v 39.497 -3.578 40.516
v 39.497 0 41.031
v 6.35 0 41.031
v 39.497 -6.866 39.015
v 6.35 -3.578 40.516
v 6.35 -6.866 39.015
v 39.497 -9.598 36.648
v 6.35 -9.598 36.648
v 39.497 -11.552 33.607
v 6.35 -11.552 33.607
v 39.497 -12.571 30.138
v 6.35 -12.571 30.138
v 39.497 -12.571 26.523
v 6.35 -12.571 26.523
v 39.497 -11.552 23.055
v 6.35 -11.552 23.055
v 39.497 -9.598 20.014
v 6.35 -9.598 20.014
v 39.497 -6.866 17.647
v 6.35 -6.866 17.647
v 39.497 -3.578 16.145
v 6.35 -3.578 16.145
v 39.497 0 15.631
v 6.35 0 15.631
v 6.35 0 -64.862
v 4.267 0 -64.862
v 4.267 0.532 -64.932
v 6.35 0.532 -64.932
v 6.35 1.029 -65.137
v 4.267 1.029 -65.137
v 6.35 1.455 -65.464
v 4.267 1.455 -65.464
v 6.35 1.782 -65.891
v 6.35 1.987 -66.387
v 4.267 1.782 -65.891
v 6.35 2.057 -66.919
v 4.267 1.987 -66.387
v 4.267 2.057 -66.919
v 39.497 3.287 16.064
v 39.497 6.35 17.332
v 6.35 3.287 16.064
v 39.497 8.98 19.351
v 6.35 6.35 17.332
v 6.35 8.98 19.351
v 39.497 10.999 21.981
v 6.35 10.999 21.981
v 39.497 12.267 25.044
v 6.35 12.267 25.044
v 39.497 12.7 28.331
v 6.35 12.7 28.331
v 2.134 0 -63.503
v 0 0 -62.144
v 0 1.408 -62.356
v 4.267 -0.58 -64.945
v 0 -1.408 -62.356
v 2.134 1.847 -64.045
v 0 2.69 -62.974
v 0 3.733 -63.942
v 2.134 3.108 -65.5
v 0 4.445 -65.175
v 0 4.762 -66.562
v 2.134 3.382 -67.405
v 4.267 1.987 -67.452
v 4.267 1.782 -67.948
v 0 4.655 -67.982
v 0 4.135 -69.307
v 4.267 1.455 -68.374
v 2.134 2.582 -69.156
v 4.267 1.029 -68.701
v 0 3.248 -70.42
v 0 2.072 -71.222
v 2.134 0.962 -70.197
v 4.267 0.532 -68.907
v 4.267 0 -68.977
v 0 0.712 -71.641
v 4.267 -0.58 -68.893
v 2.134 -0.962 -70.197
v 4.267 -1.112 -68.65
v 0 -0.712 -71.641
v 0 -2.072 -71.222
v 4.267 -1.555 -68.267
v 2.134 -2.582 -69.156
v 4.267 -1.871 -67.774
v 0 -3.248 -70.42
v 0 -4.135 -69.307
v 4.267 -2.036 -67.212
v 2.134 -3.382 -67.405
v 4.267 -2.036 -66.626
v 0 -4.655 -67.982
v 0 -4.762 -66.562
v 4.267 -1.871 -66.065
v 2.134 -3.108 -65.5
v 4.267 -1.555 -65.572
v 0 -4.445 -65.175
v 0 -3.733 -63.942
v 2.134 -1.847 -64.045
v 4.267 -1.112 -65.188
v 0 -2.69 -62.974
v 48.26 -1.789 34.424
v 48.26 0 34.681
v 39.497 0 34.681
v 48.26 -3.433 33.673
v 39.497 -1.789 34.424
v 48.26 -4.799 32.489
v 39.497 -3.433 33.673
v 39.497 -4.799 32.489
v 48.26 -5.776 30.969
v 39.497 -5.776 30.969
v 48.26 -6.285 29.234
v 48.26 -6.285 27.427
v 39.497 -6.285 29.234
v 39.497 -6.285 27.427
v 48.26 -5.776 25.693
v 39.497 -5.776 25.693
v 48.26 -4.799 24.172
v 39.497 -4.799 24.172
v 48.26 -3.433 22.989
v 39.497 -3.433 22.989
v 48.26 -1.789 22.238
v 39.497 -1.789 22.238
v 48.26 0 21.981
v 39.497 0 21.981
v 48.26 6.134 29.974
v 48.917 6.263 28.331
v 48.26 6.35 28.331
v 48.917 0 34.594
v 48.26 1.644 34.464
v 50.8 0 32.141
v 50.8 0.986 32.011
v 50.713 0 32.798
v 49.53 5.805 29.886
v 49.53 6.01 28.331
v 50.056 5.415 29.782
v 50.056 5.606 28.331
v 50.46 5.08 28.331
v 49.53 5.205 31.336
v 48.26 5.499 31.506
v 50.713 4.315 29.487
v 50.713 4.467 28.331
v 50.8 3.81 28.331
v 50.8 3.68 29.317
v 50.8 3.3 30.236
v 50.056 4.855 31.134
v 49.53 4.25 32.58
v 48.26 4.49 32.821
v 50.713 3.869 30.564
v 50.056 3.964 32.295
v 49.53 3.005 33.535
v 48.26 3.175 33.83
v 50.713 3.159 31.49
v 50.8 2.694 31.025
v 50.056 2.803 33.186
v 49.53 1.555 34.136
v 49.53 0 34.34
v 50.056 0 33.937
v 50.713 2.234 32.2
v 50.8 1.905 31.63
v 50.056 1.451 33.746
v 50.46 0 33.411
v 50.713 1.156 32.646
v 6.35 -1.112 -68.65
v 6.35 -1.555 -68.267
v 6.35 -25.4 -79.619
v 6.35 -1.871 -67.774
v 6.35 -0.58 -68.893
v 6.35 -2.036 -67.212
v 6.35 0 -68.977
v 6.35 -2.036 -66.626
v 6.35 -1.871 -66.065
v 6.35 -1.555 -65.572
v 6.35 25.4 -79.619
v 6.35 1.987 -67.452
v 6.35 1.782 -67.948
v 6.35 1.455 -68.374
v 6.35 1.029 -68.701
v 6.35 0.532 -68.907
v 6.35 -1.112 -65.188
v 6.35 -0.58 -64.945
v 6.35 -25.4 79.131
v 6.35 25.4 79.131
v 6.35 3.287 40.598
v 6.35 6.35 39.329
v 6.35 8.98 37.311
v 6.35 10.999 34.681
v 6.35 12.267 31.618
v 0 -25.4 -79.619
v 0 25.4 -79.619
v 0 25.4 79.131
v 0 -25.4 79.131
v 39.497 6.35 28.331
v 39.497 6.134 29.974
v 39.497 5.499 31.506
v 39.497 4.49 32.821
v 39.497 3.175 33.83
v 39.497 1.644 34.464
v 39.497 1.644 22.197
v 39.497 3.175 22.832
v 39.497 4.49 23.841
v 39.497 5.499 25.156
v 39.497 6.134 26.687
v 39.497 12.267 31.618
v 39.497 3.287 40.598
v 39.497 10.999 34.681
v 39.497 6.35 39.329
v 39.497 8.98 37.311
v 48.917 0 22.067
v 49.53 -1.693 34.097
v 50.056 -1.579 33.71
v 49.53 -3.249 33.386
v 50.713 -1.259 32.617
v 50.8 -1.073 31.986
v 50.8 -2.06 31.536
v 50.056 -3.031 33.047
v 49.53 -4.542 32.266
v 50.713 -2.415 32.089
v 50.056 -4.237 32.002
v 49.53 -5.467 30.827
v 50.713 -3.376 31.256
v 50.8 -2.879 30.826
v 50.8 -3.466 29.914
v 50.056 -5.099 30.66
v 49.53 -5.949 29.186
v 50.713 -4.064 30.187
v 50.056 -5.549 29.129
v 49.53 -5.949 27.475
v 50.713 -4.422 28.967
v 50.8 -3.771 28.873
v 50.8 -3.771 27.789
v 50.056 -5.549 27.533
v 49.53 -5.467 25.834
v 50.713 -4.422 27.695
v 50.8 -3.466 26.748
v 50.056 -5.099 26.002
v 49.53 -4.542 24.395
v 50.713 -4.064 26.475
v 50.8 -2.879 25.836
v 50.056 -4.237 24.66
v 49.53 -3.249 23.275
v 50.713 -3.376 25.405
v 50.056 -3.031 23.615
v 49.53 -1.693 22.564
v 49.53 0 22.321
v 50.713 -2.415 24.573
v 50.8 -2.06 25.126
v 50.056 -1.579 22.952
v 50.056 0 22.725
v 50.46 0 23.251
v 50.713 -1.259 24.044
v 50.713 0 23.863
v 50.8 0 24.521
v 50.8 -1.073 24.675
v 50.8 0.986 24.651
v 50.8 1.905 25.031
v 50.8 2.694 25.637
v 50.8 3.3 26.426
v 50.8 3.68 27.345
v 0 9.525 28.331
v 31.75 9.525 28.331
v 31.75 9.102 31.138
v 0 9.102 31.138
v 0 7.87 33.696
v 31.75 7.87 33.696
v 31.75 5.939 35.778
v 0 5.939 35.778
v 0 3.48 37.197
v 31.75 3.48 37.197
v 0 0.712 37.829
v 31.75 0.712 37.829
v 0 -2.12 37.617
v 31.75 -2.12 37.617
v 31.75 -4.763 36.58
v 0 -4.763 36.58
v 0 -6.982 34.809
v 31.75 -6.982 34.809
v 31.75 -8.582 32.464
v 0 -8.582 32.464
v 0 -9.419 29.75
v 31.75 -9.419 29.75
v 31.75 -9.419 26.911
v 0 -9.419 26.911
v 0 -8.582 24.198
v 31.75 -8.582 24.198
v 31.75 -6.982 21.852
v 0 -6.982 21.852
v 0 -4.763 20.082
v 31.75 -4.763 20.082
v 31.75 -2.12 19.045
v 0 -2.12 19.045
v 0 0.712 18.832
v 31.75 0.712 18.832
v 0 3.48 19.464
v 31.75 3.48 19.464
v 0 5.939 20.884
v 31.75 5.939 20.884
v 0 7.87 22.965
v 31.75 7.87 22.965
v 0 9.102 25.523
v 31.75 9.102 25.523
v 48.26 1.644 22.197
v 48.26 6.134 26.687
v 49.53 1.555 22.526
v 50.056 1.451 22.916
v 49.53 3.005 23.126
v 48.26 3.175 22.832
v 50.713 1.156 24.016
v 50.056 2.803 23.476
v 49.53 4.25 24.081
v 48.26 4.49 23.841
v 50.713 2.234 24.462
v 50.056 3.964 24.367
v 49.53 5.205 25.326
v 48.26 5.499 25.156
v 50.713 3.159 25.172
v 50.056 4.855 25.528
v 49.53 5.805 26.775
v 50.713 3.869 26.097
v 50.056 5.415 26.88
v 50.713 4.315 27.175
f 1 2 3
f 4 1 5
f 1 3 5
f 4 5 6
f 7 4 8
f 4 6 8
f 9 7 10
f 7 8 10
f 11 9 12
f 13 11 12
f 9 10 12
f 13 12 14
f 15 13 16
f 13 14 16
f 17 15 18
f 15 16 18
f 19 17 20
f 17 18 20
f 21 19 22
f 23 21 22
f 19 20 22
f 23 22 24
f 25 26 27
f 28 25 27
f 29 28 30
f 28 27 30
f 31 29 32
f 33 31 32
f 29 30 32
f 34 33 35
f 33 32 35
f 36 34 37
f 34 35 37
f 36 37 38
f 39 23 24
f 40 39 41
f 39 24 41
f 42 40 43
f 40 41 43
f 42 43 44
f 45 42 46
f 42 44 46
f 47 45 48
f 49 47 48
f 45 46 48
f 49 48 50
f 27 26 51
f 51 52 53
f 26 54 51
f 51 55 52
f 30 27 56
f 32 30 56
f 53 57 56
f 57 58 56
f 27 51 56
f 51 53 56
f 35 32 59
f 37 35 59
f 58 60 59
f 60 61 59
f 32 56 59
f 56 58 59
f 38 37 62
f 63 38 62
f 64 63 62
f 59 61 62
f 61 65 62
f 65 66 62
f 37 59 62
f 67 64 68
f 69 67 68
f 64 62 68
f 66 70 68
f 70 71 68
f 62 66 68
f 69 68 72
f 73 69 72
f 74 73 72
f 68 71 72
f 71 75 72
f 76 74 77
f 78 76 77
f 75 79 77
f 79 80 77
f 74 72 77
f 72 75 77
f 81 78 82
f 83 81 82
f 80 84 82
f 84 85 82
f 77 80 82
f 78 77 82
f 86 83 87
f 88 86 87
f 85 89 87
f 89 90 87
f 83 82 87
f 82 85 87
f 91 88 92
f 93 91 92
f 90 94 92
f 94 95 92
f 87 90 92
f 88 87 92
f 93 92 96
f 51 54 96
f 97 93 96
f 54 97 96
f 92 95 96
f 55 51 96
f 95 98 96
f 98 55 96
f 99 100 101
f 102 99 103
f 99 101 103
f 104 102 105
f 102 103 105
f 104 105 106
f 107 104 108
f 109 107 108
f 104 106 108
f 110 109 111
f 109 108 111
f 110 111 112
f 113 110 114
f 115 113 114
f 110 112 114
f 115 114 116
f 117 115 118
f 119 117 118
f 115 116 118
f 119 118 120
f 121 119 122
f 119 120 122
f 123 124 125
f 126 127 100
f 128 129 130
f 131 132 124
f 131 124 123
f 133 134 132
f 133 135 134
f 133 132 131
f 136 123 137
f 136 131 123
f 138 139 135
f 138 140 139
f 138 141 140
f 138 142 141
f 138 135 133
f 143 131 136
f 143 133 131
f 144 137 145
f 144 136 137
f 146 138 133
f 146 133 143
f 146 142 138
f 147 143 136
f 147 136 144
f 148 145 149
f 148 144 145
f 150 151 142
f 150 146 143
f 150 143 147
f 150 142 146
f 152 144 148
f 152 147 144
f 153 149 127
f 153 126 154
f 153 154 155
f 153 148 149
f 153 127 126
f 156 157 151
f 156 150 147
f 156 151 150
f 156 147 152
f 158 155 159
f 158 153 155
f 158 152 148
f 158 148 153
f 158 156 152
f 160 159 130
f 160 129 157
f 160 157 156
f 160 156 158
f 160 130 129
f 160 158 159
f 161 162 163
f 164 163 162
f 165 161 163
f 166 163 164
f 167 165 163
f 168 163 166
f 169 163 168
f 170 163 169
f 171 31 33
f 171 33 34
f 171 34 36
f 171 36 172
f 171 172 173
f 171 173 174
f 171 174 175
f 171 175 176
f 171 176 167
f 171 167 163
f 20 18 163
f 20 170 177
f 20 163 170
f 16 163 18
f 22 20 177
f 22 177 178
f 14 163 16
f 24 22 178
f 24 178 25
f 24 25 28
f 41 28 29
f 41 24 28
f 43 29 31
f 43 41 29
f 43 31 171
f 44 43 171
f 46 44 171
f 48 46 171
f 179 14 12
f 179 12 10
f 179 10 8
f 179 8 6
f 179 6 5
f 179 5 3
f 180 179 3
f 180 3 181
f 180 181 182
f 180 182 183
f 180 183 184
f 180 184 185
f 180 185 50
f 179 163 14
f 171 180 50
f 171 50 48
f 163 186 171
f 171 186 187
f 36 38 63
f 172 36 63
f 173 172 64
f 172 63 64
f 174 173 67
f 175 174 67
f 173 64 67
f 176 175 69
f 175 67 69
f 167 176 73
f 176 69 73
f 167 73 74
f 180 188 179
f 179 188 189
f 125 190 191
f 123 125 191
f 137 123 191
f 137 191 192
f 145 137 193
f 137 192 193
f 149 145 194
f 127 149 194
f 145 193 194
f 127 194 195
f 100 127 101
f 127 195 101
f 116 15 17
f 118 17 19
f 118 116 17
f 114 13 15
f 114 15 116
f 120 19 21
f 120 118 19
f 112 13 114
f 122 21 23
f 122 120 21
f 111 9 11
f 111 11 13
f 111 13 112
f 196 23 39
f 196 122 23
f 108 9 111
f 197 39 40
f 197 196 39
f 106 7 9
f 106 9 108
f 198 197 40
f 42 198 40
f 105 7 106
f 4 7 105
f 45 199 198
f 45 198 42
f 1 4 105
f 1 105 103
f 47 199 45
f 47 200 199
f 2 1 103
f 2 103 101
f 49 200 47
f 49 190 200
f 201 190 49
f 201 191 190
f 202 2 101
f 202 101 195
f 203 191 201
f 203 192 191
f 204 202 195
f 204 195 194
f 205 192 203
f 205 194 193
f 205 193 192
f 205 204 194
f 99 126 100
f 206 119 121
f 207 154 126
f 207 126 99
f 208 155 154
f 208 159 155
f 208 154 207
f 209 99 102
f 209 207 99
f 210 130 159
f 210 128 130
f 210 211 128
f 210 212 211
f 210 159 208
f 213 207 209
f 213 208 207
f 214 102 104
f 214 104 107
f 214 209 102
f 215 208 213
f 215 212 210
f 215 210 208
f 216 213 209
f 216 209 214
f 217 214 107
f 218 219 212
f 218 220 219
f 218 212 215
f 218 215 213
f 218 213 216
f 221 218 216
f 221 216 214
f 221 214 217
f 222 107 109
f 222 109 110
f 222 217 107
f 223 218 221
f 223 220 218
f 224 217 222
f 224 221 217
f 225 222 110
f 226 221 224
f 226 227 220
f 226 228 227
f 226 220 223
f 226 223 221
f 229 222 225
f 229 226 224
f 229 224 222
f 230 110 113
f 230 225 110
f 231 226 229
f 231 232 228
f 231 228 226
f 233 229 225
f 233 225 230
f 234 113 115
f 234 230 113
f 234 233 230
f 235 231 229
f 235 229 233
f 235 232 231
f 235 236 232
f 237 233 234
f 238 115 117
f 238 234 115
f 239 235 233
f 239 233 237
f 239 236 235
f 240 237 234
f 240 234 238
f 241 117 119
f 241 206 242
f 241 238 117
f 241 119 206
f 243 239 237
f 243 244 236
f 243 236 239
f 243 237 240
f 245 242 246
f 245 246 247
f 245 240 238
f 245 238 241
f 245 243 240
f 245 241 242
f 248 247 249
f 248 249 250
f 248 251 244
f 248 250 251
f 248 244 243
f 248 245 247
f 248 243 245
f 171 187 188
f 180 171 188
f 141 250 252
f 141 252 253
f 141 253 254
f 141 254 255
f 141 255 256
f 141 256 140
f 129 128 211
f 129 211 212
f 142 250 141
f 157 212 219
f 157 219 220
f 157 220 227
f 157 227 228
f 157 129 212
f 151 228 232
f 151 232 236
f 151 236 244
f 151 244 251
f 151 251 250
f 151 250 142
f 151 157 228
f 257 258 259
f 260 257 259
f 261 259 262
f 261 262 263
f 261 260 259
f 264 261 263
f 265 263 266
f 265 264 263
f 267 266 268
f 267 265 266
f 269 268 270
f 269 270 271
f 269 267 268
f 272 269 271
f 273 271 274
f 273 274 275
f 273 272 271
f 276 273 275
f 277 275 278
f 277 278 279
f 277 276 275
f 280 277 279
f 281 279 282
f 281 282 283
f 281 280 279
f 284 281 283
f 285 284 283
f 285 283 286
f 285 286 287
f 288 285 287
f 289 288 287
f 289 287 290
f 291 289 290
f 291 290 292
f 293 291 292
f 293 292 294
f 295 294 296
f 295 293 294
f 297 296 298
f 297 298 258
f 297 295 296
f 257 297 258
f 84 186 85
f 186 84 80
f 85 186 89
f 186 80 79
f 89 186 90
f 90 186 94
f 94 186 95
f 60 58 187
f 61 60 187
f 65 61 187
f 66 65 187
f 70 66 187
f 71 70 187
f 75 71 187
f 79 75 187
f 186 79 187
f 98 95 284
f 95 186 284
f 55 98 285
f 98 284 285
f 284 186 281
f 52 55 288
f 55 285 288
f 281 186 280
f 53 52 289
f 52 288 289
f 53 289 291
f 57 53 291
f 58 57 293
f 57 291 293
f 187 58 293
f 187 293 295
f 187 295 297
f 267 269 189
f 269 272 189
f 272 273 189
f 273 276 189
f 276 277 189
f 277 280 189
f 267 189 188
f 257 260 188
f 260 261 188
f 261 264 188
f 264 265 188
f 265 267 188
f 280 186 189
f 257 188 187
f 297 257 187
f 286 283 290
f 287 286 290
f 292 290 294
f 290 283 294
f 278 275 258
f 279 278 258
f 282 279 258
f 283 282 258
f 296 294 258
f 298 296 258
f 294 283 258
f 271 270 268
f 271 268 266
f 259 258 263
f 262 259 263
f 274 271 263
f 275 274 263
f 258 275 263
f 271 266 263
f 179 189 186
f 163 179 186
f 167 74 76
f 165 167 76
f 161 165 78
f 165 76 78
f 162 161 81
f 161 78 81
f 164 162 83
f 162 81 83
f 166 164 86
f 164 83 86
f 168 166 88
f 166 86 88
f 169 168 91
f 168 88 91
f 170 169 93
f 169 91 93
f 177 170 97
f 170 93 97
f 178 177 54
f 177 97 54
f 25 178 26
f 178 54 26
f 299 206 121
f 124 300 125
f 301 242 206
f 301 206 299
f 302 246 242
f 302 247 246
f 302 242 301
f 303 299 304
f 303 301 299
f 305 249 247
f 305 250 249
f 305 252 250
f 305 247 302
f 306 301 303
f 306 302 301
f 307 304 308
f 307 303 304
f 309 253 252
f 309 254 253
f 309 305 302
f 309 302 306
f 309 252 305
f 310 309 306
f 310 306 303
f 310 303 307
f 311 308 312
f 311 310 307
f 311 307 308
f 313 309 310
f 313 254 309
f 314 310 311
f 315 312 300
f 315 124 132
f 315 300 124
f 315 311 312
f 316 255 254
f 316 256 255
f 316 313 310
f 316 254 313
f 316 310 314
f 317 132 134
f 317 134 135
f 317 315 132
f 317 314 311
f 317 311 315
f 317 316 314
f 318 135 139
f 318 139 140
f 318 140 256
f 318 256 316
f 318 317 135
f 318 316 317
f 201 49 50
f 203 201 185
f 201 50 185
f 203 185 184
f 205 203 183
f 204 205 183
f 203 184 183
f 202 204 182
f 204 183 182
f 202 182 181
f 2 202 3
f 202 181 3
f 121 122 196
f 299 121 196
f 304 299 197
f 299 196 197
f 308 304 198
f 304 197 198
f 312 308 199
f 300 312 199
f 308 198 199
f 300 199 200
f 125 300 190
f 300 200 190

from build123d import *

# Parameters (mm, degrees)
F1_DEPTH = 6.35
F2_DEPTH = 39.497
F3_DEPTH = 50.8
F4_R     = 2.54
F6_DEPTH = 31.75


# Not quite as in the source:
# - a fillet or chamfer that OpenCascade refuses, or shapes differently, is made with other operations: its cross-section is extruded or revolved along the edge and cut away or added


with BuildPart() as f1:
    # F0 (on Right) → F1 (new body)
    with BuildSketch(Plane.YZ):
        with BuildLine():
            Line((0, 79.1307692308), (-25.4, 79.1307692308))
            Line((-25.4, 79.1307692308), (-25.4, -79.6192307692))
            Line((-25.4, -79.6192307692), (0, -79.6192307692))
            Line((0, -79.6192307692), (0, -68.9766307692))
            ThreePointArc((0, -68.9766307692), (-2.0574, -66.9192307692), (0, -64.8618307692))
            Line((0, -64.8618307692), (0, -54.2192307692))
            Line((0, -54.2192307692), (0, -41.5192307692))
            Line((0, -41.5192307692), (0, 15.6307692308))
            ThreePointArc((0, 15.6307692308), (-12.7, 28.3307692308), (0, 41.0307692308))
            Line((0, 41.0307692308), (0, 79.1307692308))
        make_face()
        with BuildLine():
            Line((25.4, 79.1307692308), (0, 79.1307692308))
            Line((0, 79.1307692308), (0, 41.0307692308))
            ThreePointArc((0, 41.0307692308), (8.9802561211, 37.3110253518), (12.7, 28.3307692308))
            ThreePointArc((12.7, 28.3307692308), (8.9802561211, 19.3505131097), (0, 15.6307692308))
            Line((0, 15.6307692308), (0, -41.5192307692))
            Line((0, -41.5192307692), (0, -54.2192307692))
            Line((0, -54.2192307692), (0, -64.8618307692))
            ThreePointArc((0, -64.8618307692), (1.4548014916, -65.4644292776), (2.0574, -66.9192307692))
            ThreePointArc((2.0574, -66.9192307692), (1.4548014916, -68.3740322608), (0, -68.9766307692))
            Line((0, -68.9766307692), (0, -79.6192307692))
            Line((0, -79.6192307692), (25.4, -79.6192307692))
            Line((25.4, -79.6192307692), (25.4, 79.1307692308))
        make_face()
    extrude(amount=F1_DEPTH)

    # F0 (on Right) → F2 (join)
    with BuildSketch(Plane.YZ):
        with BuildLine():
            Line((0, 37.8557692308), (0, 41.0307692308))
            ThreePointArc((0, 41.0307692308), (-12.7, 28.3307692308), (0, 15.6307692308))
            Line((0, 15.6307692308), (0, 18.8057692308))
            ThreePointArc((0, 18.8057692308), (-9.525, 28.3307692308), (0, 37.8557692308))
        make_face()
        with BuildLine():
            ThreePointArc((12.7, 28.3307692308), (8.9802561211, 37.3110253518), (0, 41.0307692308))
            Line((0, 41.0307692308), (0, 37.8557692308))
            ThreePointArc((0, 37.8557692308), (6.7351920908, 35.0659613216), (9.525, 28.3307692308))
            ThreePointArc((9.525, 28.3307692308), (6.7351920908, 21.59557714), (0, 18.8057692308))
            Line((0, 18.8057692308), (0, 15.6307692308))
            ThreePointArc((0, 15.6307692308), (8.9802561211, 19.3505131097), (12.7, 28.3307692308))
        make_face()
        with BuildLine():
            Line((0, 34.6807692308), (0, 37.8557692308))
            ThreePointArc((0, 37.8557692308), (-9.525, 28.3307692308), (0, 18.8057692308))
            Line((0, 18.8057692308), (0, 21.9807692308))
            ThreePointArc((0, 21.9807692308), (-6.35, 28.3307692308), (0, 34.6807692308))
        make_face()
        with BuildLine():
            ThreePointArc((9.525, 28.3307692308), (6.7351920908, 35.0659613216), (0, 37.8557692308))
            Line((0, 37.8557692308), (0, 34.6807692308))
            ThreePointArc((0, 34.6807692308), (4.4901280605, 32.8208972913), (6.35, 28.3307692308))
            ThreePointArc((6.35, 28.3307692308), (4.4901280605, 23.8406411702), (0, 21.9807692308))
            Line((0, 21.9807692308), (0, 18.8057692308))
            ThreePointArc((0, 18.8057692308), (6.7351920908, 21.59557714), (9.525, 28.3307692308))
        make_face()
    extrude(amount=F2_DEPTH)

    # F0 (on Right) → F3 (join)
    with BuildSketch(Plane.YZ):
        with BuildLine():
            Line((0, 28.3307692308), (0, 34.6807692308))
            ThreePointArc((0, 34.6807692308), (-6.35, 28.3307692308), (0, 21.9807692308))
            Line((0, 21.9807692308), (0, 28.3307692308))
        make_face()
        with BuildLine():
            ThreePointArc((6.35, 28.3307692308), (4.4901280605, 32.8208972913), (0, 34.6807692308))
            Line((0, 34.6807692308), (0, 28.3307692308))
            Line((0, 28.3307692308), (0, 21.9807692308))
            ThreePointArc((0, 21.9807692308), (4.4901280605, 23.8406411702), (6.35, 28.3307692308))
        make_face()
    extrude(amount=F3_DEPTH)

    # F4
    f4_edges = [f1.edges().sort_by_distance(p)[0] for p in [
        (50.8, 0, 34.680769),
    ]]
    fillet(f4_edges, radius=F4_R)

    # F5: chamfer of 2.7178 x 4.2672 on 1 edges, made by hand

    # F5_s1 → F5_t2 (revolve, cut)
    with BuildSketch(Plane.XZ):
        Polygon((4.2672, -64.8618307692), (0, -62.1440307692), (0, -64.8618307692), align=None)
    revolve(axis=Axis((0, 0, -66.9192307692), (-1, 0, 0)), mode=Mode.SUBTRACT)

    # F0 (on Right) → F6 (cut)
    with BuildSketch(Plane.YZ):
        with BuildLine():
            Line((0, 34.6807692308), (0, 37.8557692308))
            ThreePointArc((0, 37.8557692308), (-9.525, 28.3307692308), (0, 18.8057692308))
            Line((0, 18.8057692308), (0, 21.9807692308))
            ThreePointArc((0, 21.9807692308), (-6.35, 28.3307692308), (0, 34.6807692308))
        make_face()
        with BuildLine():
            Line((0, 28.3307692308), (0, 34.6807692308))
            ThreePointArc((0, 34.6807692308), (-6.35, 28.3307692308), (0, 21.9807692308))
            Line((0, 21.9807692308), (0, 28.3307692308))
        make_face()
        with BuildLine():
            ThreePointArc((6.35, 28.3307692308), (4.4901280605, 32.8208972913), (0, 34.6807692308))
            Line((0, 34.6807692308), (0, 28.3307692308))
            Line((0, 28.3307692308), (0, 21.9807692308))
            ThreePointArc((0, 21.9807692308), (4.4901280605, 23.8406411702), (6.35, 28.3307692308))
        make_face()
        with BuildLine():
            ThreePointArc((9.525, 28.3307692308), (6.7351920908, 35.0659613216), (0, 37.8557692308))
            Line((0, 37.8557692308), (0, 34.6807692308))
            ThreePointArc((0, 34.6807692308), (4.4901280605, 32.8208972913), (6.35, 28.3307692308))
            ThreePointArc((6.35, 28.3307692308), (4.4901280605, 23.8406411702), (0, 21.9807692308))
            Line((0, 21.9807692308), (0, 18.8057692308))
            ThreePointArc((0, 18.8057692308), (6.7351920908, 21.59557714), (9.525, 28.3307692308))
        make_face()
    extrude(amount=F6_DEPTH, mode=Mode.SUBTRACT)


solid = f1.part
